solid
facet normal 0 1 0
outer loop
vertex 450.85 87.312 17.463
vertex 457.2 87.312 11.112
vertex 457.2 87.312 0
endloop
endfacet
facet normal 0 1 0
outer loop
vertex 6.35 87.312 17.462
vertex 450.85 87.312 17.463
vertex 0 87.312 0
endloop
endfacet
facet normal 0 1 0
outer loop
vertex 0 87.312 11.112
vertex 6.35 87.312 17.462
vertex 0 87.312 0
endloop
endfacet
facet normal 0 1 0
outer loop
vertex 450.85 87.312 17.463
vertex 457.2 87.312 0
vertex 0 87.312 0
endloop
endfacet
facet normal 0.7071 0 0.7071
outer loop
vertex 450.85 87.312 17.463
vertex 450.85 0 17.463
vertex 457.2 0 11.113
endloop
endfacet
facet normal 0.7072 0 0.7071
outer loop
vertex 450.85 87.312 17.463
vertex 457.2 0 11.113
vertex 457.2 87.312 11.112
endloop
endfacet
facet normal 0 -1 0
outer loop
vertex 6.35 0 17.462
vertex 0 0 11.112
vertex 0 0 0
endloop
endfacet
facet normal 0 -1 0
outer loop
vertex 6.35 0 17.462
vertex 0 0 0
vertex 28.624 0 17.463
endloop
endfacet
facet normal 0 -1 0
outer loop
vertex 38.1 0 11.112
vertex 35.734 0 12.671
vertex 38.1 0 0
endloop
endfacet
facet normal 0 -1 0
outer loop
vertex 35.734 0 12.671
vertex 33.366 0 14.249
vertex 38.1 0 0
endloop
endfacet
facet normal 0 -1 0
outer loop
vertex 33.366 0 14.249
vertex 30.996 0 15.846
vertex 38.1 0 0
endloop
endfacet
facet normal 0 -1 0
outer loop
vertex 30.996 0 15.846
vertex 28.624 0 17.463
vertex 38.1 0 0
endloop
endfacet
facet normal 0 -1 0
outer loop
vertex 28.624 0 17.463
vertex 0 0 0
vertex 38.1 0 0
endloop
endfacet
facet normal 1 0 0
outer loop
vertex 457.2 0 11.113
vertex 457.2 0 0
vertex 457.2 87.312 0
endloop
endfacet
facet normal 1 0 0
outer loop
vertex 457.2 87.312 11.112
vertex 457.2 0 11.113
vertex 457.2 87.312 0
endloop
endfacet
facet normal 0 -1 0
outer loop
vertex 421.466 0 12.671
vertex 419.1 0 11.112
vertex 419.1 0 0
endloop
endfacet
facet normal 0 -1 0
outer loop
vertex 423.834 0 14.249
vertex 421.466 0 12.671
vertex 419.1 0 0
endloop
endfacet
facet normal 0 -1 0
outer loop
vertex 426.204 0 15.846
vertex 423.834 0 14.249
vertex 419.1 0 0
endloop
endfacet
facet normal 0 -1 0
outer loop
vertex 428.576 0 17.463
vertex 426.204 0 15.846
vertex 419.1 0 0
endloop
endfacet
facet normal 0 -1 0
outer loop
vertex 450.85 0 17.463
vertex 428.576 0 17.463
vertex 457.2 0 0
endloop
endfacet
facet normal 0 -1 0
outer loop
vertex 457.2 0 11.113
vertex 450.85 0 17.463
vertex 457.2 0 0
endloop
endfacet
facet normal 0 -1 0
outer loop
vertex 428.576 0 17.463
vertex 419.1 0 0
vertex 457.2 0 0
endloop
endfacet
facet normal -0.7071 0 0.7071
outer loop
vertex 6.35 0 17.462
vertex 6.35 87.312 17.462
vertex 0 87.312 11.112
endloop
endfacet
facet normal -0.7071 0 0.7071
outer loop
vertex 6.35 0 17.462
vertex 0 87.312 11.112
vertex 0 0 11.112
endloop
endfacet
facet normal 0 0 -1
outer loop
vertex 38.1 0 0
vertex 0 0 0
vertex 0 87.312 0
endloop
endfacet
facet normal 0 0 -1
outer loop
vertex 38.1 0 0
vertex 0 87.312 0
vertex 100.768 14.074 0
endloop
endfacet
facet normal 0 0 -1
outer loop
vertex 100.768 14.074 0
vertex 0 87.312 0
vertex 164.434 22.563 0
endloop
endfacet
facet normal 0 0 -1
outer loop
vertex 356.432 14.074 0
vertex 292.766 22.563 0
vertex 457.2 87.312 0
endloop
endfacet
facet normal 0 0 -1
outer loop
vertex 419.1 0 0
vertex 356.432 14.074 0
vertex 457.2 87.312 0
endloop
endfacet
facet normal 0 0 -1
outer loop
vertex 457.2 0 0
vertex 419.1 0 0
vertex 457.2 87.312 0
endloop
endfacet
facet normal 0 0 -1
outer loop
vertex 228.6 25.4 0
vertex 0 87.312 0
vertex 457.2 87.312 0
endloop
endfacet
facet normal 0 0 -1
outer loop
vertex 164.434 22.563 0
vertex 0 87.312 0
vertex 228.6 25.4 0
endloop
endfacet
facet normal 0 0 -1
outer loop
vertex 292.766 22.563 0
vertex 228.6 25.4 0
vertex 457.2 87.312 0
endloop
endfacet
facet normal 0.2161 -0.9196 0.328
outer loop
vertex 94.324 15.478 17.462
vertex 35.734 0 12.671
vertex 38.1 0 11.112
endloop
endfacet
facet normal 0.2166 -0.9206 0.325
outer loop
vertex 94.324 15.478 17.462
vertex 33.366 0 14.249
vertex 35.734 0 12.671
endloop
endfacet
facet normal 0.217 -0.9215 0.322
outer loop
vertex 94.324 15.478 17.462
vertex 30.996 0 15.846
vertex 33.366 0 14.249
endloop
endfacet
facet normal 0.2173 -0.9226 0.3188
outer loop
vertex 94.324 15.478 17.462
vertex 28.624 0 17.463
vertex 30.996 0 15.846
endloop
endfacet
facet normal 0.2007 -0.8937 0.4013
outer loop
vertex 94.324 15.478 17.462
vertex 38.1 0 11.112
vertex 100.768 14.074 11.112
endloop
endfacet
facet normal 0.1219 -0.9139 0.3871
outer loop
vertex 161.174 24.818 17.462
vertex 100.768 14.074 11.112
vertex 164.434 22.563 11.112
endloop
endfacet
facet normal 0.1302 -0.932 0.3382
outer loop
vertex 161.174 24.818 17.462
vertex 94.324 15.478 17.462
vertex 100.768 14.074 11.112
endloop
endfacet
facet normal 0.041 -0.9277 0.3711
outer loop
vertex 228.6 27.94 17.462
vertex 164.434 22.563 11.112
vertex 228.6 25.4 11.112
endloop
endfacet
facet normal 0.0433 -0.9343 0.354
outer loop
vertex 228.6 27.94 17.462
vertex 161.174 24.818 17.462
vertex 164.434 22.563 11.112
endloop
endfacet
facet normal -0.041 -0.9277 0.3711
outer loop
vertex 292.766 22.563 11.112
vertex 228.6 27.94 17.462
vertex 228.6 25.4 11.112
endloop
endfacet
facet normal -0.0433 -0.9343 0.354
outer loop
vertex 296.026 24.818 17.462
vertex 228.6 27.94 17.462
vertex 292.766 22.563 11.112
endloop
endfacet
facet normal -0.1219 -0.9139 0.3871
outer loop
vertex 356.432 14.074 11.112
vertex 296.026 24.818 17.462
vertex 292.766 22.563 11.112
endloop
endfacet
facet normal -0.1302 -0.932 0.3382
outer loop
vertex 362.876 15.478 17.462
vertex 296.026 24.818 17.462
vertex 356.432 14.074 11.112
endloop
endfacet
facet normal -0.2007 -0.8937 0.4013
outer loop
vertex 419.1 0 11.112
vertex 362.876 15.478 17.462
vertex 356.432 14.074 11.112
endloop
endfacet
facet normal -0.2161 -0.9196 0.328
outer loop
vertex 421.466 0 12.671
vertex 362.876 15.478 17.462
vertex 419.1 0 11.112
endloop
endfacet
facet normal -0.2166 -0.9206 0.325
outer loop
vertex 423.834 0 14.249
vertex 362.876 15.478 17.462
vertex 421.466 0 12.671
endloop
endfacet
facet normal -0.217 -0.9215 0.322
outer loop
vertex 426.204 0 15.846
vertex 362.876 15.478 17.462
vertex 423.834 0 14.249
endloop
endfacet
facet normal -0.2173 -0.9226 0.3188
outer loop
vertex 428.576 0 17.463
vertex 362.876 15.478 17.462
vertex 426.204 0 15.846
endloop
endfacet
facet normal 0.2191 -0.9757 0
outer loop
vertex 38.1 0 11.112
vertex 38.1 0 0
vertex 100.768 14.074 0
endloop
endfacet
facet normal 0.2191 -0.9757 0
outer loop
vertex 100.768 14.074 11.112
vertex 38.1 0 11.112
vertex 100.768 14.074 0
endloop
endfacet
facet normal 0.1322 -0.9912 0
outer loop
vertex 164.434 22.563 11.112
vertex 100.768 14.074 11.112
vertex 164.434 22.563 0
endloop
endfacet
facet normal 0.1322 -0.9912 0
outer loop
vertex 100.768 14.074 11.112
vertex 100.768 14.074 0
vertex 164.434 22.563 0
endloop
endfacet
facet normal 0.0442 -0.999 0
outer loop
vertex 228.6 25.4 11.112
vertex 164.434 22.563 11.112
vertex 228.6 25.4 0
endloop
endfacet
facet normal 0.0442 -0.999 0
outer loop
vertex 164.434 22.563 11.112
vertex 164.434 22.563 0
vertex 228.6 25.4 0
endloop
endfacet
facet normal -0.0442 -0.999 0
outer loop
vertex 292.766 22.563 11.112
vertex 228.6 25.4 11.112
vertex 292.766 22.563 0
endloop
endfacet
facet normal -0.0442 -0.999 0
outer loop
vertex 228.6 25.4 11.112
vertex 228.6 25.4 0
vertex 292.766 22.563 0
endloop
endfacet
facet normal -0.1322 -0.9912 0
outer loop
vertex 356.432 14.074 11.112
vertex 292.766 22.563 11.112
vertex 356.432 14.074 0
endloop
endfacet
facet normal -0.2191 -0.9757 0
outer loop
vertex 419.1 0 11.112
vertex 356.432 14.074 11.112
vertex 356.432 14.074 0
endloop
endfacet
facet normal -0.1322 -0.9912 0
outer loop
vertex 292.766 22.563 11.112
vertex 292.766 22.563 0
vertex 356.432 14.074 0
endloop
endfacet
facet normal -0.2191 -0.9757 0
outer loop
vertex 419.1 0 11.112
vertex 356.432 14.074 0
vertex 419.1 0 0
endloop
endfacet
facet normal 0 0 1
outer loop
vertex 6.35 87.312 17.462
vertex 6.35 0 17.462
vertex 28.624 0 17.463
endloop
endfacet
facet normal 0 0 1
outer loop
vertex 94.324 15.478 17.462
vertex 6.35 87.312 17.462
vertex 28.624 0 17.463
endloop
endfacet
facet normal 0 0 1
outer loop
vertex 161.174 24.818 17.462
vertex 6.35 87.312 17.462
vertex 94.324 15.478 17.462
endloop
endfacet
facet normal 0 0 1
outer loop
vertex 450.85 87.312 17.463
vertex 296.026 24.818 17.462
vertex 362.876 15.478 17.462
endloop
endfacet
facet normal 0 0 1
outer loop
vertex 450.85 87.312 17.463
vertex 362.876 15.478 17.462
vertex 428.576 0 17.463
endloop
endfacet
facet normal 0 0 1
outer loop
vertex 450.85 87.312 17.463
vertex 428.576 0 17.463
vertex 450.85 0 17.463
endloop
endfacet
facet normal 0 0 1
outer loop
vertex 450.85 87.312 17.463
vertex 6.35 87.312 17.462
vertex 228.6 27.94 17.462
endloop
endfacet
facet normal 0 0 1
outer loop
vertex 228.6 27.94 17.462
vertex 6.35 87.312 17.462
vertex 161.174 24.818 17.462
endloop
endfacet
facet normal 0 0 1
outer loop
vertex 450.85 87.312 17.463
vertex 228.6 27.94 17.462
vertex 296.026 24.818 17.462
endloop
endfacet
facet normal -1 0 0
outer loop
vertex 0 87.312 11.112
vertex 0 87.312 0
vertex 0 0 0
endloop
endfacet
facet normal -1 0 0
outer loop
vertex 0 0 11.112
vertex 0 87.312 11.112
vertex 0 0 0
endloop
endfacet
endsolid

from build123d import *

# Parameters (mm, degrees)
F1_DEPTH = 17.4625
F2_SIZE  = 6.35
F3_SIZE2 = 2.54
F3_SIZE  = 6.35


with BuildPart() as f1:
    # F0 (on Top) → F1 (new body)
    with BuildSketch(Plane.XY):
        with BuildLine():
            Line((0, 87.3125), (0, 0))
            Line((0, 0), (38.1, 0))
            ThreePointArc((38.1, 0), (228.6, 25.4), (419.1, 0))
            Line((419.1, 0), (457.2, 0))
            Line((457.2, 0), (457.2, 87.3125))
            Line((457.2, 87.3125), (0, 87.3125))
        make_face()
    extrude(amount=F1_DEPTH)

    # F2
    f2_edges = [f1.edges().sort_by_distance(p)[0] for p in [
        (0, 43.65625, 17.4625),
        (457.2, 43.65625, 17.4625),
    ]]
    chamfer(f2_edges, length=F2_SIZE)

    # F3
    f3_edges = [f1.edges().sort_by_distance(p)[0] for p in [
        (228.6, 25.4, 17.4625),
    ]]
    f3_side = f1.faces().sort_by_distance((228.6, 25.4, 8.73125))[0]
    chamfer(f3_edges, length=F3_SIZE, length2=F3_SIZE2, reference=f3_side)


solid = f1.part
